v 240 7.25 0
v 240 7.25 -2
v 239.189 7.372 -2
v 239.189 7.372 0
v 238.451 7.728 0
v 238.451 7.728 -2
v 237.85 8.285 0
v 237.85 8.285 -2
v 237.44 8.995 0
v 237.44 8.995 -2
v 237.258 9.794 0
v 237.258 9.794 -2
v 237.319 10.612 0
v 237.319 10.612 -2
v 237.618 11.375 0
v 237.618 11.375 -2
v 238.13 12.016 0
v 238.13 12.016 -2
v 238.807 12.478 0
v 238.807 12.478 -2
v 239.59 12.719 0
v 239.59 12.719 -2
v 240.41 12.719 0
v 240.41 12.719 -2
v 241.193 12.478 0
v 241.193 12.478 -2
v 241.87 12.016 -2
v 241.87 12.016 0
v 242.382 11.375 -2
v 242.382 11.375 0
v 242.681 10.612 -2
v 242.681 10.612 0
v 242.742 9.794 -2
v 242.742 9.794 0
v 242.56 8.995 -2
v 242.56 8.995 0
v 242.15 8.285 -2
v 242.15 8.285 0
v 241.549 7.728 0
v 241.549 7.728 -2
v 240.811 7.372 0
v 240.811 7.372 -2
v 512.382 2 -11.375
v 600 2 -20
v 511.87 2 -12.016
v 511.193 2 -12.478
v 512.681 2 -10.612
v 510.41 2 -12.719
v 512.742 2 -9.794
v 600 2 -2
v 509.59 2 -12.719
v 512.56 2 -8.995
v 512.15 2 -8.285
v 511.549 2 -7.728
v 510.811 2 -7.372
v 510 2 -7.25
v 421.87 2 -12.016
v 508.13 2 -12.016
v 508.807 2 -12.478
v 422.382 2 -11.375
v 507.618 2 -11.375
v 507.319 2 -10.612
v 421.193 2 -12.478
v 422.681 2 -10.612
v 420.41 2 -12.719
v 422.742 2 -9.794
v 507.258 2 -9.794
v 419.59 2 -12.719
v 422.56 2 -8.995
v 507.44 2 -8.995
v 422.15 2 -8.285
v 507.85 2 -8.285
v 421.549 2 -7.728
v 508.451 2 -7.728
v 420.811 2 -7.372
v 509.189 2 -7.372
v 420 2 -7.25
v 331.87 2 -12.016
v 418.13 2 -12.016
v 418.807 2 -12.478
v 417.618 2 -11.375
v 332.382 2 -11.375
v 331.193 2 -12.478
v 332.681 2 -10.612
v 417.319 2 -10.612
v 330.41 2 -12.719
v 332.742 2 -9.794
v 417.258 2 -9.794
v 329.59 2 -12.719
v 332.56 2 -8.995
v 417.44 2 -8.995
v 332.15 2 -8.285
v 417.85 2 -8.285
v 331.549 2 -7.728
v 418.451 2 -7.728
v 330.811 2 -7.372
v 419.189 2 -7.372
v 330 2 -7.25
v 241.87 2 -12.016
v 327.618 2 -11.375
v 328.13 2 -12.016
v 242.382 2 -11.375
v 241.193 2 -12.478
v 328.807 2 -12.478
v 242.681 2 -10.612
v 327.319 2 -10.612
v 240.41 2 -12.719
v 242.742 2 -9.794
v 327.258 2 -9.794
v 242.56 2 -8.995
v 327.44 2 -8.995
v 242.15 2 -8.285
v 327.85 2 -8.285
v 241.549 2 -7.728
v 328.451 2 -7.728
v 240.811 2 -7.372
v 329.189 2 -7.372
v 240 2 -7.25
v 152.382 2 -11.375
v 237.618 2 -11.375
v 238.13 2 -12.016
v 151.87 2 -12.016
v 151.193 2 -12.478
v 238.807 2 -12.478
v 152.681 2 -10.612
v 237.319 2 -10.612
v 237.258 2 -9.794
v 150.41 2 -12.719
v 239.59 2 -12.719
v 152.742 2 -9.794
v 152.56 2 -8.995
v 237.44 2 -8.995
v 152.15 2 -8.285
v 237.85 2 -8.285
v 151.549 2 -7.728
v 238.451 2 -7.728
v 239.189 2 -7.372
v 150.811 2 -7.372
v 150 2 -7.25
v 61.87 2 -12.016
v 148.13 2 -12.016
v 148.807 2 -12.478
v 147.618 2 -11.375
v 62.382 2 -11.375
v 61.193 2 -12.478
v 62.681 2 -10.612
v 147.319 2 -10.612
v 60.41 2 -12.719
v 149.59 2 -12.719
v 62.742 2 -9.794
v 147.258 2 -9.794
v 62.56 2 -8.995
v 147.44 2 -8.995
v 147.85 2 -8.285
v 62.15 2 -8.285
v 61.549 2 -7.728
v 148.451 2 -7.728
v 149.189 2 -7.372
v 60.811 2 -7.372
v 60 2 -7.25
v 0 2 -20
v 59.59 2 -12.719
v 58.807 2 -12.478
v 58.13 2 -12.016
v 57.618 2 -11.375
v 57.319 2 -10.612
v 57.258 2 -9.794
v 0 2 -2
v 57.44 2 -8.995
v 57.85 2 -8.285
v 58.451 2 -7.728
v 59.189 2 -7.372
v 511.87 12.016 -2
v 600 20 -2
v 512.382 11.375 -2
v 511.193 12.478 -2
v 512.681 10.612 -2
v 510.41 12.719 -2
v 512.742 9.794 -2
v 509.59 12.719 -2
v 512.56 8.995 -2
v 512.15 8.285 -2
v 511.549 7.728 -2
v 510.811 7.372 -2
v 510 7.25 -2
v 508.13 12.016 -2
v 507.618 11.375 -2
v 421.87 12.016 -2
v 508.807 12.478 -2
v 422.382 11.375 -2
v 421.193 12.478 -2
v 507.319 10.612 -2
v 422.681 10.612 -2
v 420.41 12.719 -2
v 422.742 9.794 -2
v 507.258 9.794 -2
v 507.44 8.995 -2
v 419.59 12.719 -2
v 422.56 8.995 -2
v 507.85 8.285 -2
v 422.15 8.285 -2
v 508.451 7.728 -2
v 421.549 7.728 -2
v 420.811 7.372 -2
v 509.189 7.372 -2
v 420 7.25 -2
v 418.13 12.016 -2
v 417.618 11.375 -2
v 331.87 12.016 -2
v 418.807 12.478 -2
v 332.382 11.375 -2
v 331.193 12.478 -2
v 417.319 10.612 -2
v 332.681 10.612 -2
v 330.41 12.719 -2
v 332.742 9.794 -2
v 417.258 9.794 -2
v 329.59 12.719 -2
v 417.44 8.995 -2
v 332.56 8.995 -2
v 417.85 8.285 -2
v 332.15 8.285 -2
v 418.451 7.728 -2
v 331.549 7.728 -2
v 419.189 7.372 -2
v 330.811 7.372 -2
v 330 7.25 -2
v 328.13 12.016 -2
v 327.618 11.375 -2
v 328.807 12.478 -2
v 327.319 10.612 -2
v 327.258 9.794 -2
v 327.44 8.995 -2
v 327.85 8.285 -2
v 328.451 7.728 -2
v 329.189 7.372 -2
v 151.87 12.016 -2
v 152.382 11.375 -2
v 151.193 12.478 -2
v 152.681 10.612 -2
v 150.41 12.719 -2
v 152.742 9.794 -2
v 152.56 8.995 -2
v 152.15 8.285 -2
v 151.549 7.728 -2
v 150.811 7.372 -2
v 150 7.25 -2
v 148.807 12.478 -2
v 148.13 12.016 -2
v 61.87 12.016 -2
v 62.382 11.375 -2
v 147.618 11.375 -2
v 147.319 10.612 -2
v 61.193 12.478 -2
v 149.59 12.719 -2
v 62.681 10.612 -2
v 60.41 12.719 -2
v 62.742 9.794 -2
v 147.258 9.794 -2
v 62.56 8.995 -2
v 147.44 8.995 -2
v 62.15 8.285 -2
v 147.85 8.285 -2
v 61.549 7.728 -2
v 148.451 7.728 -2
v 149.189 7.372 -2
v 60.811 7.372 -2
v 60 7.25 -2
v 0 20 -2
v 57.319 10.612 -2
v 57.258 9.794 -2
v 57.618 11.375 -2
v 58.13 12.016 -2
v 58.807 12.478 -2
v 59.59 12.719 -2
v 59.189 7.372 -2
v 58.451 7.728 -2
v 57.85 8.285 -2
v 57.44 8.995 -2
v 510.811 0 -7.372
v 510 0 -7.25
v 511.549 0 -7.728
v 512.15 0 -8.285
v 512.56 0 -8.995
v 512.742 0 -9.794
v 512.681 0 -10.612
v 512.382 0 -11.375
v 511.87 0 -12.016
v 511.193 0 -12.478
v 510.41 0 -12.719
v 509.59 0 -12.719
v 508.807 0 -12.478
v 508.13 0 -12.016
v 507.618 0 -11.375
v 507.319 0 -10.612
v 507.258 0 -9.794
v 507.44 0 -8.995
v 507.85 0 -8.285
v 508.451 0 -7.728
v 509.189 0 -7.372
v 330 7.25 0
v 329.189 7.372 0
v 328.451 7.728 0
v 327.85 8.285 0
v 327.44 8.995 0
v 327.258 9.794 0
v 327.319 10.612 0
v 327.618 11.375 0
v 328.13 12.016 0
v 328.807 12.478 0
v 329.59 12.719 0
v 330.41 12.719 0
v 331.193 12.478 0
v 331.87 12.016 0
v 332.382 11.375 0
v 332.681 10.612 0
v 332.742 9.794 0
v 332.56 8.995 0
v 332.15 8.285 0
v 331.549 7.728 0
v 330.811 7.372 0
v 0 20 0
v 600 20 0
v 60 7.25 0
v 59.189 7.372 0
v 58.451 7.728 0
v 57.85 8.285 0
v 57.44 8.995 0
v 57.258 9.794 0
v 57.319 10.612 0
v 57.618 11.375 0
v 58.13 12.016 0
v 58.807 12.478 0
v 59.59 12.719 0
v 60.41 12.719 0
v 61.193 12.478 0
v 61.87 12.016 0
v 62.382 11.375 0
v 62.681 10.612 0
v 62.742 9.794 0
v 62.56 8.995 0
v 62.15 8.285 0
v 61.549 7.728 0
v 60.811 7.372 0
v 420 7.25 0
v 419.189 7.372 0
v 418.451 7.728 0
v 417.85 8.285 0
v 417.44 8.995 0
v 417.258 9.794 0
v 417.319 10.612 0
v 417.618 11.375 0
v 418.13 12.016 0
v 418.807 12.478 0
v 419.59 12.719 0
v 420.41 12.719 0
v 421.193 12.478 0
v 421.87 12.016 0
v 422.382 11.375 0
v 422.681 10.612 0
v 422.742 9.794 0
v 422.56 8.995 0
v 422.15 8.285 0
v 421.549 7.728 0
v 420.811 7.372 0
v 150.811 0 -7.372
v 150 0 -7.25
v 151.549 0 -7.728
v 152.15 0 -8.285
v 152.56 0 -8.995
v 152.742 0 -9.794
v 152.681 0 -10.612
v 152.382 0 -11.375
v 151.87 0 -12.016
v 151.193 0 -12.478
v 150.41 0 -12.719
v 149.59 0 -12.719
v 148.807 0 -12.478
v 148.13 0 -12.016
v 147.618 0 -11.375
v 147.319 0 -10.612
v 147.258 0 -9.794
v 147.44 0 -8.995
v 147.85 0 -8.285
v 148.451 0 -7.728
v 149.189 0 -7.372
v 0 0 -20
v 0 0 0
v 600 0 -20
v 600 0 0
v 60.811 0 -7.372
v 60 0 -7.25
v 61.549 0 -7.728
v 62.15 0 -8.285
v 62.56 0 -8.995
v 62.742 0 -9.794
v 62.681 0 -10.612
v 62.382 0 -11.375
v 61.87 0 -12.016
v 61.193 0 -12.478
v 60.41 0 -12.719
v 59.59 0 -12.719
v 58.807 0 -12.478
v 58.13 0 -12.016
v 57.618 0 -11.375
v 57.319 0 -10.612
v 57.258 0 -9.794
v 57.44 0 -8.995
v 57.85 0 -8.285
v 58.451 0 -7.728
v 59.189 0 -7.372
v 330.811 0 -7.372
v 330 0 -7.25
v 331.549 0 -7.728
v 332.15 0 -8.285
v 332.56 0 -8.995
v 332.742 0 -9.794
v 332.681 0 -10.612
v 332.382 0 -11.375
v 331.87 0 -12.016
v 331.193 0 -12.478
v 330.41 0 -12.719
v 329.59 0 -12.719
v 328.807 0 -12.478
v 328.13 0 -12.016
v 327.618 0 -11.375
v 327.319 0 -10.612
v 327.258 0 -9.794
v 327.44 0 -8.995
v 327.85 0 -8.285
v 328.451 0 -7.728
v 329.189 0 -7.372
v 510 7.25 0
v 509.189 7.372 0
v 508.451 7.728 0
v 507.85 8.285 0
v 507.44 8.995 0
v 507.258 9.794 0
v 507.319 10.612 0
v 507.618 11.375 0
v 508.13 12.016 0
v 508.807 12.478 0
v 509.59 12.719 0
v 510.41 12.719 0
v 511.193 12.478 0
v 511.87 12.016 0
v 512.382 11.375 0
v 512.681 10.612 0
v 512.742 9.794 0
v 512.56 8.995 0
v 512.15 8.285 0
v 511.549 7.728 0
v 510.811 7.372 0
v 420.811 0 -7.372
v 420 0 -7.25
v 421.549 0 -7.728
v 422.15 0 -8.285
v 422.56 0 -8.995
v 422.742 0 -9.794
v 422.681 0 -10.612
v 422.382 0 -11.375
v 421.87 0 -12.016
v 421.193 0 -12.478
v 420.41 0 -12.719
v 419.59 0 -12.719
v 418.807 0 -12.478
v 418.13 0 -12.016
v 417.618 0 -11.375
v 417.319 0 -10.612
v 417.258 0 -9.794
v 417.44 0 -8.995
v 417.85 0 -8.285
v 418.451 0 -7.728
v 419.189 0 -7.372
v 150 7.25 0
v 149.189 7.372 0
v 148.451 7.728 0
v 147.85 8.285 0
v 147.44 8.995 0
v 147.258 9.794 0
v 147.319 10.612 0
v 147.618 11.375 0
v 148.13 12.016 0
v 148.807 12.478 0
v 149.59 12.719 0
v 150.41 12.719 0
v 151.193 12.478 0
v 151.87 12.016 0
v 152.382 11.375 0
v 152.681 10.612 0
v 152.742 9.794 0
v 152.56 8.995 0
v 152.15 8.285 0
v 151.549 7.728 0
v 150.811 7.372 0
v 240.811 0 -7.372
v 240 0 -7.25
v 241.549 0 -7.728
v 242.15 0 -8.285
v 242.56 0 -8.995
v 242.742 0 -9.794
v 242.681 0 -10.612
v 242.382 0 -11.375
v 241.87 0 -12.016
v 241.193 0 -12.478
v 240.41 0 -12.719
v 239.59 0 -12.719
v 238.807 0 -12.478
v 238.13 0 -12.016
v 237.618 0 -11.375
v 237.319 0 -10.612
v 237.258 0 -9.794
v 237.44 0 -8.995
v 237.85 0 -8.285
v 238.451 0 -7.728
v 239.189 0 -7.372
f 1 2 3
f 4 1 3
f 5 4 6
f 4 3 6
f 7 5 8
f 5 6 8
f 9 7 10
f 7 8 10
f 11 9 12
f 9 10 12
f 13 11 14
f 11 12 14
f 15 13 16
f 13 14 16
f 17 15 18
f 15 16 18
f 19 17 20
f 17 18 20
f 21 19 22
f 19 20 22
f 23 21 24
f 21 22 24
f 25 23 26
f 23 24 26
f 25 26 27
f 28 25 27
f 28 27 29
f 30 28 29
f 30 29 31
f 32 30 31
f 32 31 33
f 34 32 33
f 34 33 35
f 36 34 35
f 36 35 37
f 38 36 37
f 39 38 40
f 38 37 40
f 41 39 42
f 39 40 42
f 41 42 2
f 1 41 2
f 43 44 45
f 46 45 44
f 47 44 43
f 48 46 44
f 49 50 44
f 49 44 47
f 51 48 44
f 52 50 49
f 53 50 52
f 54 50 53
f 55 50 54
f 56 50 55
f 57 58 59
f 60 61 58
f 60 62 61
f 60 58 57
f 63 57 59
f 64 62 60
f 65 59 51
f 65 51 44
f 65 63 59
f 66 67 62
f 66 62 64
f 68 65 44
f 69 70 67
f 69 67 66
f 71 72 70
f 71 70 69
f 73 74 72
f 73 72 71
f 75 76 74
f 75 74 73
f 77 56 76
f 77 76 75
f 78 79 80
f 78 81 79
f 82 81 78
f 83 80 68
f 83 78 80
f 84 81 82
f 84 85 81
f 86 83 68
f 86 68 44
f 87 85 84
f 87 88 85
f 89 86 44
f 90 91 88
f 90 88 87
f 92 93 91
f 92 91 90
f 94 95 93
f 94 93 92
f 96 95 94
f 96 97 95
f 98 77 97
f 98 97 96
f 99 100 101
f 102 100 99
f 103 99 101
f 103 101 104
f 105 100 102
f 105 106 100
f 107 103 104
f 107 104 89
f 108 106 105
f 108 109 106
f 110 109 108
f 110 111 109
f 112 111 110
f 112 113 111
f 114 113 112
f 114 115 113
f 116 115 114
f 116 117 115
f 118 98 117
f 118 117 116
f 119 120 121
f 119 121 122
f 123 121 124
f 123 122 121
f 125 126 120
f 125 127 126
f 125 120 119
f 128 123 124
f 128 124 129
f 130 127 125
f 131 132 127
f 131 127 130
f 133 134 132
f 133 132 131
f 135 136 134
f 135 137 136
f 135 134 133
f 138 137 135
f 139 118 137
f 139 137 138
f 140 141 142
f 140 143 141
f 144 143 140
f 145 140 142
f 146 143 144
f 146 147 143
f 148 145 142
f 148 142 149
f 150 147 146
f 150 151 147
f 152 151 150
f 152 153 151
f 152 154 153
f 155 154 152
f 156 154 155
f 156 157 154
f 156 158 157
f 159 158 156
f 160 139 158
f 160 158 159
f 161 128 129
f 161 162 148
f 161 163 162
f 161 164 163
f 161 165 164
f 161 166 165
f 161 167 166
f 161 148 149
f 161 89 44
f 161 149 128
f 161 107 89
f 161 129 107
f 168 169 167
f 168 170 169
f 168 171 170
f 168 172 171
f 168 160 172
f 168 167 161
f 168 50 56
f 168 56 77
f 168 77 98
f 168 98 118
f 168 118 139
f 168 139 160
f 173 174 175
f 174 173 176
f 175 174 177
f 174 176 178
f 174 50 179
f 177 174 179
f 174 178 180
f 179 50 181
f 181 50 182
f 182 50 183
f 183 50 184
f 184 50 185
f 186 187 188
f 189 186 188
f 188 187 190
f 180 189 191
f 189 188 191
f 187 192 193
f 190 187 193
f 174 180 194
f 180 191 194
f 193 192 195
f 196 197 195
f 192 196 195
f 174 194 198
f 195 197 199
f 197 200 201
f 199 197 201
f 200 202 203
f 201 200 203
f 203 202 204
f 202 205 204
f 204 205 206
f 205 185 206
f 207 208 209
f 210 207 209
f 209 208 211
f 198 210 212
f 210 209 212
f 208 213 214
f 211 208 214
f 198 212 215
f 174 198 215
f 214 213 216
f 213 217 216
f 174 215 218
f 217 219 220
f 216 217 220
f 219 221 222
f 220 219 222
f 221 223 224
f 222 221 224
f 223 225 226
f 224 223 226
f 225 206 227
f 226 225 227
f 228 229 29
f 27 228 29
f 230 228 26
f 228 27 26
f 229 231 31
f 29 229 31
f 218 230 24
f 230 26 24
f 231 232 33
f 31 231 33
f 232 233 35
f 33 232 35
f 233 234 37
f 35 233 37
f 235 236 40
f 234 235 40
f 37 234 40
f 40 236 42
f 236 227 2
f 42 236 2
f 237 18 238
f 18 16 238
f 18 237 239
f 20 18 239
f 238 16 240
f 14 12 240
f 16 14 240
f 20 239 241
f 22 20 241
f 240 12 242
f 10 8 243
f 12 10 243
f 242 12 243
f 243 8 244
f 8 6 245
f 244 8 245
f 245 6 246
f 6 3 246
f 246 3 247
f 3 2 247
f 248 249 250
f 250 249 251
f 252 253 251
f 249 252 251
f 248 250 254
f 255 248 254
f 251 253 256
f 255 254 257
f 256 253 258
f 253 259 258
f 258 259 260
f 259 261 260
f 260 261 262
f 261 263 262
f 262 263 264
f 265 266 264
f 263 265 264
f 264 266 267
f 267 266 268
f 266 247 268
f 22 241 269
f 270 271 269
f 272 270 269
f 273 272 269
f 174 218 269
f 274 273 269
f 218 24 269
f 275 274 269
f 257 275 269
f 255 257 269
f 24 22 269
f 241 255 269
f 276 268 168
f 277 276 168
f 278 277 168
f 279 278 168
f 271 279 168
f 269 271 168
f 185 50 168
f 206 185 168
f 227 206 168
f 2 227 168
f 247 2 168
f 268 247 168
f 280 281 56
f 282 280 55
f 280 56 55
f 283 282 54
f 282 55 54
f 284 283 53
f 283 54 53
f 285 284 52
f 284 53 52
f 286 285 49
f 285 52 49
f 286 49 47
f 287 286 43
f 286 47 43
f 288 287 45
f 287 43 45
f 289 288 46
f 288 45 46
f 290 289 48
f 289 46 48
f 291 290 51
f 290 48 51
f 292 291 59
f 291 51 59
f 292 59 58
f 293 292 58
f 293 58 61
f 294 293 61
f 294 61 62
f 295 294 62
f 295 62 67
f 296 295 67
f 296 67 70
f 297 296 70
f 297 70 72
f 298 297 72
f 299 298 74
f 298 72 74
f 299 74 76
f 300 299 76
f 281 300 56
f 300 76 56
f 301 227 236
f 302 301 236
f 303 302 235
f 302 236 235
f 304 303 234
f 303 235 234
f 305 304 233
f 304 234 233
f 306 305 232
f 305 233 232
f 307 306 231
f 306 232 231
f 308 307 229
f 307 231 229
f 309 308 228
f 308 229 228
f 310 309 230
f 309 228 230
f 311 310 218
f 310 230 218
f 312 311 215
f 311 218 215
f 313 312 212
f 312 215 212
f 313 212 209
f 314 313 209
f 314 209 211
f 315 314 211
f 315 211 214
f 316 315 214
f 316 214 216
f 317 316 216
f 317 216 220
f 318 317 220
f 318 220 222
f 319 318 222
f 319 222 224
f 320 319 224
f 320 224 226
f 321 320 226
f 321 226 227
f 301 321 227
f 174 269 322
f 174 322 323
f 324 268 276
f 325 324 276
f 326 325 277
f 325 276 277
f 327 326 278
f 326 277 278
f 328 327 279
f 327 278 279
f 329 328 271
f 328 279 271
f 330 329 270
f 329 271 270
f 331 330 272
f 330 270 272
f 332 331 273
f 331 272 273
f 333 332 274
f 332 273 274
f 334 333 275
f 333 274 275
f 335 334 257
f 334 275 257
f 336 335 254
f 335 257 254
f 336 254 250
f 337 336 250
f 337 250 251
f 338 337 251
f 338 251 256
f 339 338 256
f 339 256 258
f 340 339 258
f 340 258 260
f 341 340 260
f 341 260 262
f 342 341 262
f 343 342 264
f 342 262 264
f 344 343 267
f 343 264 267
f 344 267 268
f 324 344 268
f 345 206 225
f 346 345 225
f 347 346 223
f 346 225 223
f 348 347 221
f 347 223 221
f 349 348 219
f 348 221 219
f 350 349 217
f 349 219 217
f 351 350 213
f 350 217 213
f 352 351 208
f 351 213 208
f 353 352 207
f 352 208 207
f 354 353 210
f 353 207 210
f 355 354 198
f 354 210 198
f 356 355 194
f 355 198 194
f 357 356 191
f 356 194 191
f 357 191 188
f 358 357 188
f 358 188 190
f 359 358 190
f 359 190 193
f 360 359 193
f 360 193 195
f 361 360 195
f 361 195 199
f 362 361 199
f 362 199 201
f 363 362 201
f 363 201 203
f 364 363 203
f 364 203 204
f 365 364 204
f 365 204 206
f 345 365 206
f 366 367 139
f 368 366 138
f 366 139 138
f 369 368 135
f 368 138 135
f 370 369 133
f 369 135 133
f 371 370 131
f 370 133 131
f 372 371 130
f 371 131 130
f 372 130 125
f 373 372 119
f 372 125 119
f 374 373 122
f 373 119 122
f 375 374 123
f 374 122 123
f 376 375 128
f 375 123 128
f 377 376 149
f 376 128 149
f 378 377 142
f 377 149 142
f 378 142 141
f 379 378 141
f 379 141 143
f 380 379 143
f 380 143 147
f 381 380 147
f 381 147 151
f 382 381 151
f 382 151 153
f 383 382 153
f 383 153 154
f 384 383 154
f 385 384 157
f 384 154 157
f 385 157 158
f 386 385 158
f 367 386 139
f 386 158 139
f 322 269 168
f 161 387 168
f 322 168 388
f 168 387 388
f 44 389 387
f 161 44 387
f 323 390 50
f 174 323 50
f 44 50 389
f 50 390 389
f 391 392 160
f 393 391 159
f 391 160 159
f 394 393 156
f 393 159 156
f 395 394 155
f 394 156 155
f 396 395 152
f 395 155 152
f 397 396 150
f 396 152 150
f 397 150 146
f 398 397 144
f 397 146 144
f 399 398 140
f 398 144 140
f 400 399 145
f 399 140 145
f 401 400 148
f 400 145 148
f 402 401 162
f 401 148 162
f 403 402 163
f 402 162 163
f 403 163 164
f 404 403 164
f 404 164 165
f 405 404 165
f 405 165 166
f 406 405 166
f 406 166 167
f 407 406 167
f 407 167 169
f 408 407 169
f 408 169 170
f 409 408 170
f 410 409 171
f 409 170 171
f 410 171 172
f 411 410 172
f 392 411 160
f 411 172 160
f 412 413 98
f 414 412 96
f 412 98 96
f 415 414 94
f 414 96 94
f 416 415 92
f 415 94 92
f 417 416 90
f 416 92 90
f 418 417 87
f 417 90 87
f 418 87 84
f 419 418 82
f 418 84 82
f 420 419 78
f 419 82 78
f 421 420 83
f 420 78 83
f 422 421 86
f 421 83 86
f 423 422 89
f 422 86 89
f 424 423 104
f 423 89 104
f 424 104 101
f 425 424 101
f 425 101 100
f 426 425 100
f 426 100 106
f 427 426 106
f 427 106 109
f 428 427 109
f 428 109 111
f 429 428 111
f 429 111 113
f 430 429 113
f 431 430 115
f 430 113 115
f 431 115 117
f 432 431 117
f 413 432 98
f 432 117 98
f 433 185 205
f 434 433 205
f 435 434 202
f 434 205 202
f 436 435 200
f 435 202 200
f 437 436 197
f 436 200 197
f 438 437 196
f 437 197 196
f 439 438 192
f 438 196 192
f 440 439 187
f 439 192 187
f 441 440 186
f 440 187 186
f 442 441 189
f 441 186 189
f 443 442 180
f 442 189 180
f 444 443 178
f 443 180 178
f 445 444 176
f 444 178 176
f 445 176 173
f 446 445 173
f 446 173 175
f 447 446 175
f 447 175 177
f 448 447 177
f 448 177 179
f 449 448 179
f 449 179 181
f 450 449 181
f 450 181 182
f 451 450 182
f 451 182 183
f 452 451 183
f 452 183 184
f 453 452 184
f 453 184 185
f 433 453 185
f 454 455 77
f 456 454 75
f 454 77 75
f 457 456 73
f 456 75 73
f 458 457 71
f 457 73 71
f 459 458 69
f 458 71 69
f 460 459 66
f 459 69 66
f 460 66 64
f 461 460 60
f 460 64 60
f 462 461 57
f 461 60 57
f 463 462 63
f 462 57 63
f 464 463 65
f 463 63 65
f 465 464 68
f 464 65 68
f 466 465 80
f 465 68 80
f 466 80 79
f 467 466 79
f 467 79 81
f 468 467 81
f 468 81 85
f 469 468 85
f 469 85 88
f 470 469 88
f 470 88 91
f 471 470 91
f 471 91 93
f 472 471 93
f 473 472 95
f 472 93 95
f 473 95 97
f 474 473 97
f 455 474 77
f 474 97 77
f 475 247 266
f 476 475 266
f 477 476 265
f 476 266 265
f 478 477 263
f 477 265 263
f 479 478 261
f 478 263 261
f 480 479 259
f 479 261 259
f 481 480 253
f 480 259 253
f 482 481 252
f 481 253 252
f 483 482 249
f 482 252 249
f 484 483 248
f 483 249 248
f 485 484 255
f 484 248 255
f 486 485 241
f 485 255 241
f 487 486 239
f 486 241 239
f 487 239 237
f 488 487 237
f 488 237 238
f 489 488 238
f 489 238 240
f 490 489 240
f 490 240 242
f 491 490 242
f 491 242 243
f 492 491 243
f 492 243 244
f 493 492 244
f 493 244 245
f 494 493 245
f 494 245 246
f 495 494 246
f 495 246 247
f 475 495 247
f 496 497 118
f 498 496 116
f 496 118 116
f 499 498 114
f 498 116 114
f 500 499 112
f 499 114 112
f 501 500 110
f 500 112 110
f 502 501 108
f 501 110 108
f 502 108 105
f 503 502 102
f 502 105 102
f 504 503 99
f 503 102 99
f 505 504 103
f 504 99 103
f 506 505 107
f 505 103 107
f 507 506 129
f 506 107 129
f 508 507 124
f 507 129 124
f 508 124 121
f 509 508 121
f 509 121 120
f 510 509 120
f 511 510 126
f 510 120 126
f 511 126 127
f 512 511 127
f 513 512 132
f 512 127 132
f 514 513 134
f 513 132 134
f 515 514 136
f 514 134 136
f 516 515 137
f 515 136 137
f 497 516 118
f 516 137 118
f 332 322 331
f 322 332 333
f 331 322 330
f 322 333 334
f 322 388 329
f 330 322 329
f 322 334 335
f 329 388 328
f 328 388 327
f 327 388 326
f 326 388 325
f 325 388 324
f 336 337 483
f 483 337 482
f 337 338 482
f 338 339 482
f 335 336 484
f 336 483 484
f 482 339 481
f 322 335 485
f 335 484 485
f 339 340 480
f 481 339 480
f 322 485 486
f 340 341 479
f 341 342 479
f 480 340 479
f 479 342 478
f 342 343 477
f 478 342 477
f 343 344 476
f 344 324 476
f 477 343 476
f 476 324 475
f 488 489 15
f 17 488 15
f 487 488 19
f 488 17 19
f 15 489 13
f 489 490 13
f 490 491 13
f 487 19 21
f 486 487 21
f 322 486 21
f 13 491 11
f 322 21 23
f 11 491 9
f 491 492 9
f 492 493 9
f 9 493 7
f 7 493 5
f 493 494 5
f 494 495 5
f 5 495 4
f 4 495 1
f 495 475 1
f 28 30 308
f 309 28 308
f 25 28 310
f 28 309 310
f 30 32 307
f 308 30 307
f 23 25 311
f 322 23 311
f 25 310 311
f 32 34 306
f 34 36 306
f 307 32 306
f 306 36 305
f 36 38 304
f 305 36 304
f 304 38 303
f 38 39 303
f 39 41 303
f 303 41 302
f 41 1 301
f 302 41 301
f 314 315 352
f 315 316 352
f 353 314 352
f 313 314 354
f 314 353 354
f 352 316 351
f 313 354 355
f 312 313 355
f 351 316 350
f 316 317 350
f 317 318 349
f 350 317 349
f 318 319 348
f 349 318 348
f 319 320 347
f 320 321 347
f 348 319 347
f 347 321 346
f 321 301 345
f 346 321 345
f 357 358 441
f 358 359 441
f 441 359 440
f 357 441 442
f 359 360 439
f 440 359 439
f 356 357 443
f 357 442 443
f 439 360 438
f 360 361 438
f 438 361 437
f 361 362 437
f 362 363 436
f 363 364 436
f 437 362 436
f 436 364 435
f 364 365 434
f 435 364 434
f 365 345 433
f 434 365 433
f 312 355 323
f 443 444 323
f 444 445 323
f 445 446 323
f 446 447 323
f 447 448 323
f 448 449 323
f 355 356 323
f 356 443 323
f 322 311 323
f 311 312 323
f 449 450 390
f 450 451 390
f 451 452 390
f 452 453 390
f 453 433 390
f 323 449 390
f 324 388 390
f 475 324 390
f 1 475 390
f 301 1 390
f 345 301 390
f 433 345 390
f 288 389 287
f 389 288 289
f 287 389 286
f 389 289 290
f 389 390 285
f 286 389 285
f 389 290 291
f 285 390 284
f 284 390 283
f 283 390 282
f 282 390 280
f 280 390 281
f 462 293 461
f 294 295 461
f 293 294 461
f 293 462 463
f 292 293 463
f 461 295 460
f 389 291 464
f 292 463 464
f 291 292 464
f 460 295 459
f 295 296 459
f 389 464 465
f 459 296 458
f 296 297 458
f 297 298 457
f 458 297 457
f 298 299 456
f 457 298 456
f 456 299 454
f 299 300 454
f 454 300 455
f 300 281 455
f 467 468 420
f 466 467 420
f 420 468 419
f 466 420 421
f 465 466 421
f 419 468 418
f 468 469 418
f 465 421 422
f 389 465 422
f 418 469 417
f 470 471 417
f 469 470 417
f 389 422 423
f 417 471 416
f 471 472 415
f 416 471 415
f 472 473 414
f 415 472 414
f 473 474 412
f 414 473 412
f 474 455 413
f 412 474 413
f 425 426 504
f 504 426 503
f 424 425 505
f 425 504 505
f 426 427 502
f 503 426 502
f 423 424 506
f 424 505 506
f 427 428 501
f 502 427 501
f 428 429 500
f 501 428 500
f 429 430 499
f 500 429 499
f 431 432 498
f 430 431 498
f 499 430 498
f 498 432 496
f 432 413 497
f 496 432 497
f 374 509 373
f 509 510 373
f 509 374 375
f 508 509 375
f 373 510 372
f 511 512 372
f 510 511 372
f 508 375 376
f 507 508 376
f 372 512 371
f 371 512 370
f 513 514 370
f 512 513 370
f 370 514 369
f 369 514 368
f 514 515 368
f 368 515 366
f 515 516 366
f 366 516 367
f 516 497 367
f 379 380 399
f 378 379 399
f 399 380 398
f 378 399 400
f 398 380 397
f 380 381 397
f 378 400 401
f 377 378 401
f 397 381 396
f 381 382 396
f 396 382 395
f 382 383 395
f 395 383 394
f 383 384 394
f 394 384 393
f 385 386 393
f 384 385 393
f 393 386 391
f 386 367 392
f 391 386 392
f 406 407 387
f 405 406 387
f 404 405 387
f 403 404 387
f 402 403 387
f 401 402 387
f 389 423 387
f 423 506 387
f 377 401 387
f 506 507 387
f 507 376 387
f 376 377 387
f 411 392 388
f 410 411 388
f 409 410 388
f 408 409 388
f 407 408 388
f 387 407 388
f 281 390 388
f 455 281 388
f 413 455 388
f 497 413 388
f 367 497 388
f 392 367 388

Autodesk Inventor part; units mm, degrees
ref_plane "YZ Plane" through (0, 0, 0) normal (1, 0, 0) x (0, 1, 0)
ref_plane "XZ Plane" through (0, 0, 0) normal (0, 1, 0) x (-1, 0, 0)
ref_plane "XY Plane" through (0, 0, 0) normal (0, 0, 1) x (1, 0, 0)
sketch "Sketch1" plane through (0, 0, 0) normal (0, 1, 0) x (-1, 0, 0)
  line L0 (0, 0) -> (-600, 0)
  line L1 (-600, 0) -> (-600, -20)
  line L2 (-600, -20) -> (0, -20)
  line L3 (0, -20) -> (0, 0)
  dimension "d0" = 600
  dimension "d1" = 20
extrude "Extrusion1" add sketch "Sketch1" along normal blind 2
sketch "Sketch2" plane through (0, 2, 0) normal (0, 1, 0) x (1, 0, 0)
  line L0 (0, 0) -> (600, 0)
  line L1 (600, 0) -> (600, 2)
  line L2 (600, 2) -> (0, 2)
  line L3 (0, 2) -> (0, 0)
  dimension "d4" = 600
  dimension "d5" = 2
extrude "Extrusion2" add sketch "Sketch2" along normal blind 18
hole "Hole1" at (60, 10, 0) direction (0, 0, -1) diameter 5.5 end through all
pattern_linear "Rectangular Pattern1" count 6 spacing 90 along (1, 0, 0) of "Hole1"
ref_plane "Work Plane1" through (450, 2, -2) normal (0, 0.7071, 0.7071) x (1, 0, 0)
mirror "Mirror1" about plane through (450, 2, -2) normal (0, 0.7071, 0.7071) of "Hole1", "Rectangular Pattern1"
properties part number "Lbarx2" material "Aluminum 6061"
